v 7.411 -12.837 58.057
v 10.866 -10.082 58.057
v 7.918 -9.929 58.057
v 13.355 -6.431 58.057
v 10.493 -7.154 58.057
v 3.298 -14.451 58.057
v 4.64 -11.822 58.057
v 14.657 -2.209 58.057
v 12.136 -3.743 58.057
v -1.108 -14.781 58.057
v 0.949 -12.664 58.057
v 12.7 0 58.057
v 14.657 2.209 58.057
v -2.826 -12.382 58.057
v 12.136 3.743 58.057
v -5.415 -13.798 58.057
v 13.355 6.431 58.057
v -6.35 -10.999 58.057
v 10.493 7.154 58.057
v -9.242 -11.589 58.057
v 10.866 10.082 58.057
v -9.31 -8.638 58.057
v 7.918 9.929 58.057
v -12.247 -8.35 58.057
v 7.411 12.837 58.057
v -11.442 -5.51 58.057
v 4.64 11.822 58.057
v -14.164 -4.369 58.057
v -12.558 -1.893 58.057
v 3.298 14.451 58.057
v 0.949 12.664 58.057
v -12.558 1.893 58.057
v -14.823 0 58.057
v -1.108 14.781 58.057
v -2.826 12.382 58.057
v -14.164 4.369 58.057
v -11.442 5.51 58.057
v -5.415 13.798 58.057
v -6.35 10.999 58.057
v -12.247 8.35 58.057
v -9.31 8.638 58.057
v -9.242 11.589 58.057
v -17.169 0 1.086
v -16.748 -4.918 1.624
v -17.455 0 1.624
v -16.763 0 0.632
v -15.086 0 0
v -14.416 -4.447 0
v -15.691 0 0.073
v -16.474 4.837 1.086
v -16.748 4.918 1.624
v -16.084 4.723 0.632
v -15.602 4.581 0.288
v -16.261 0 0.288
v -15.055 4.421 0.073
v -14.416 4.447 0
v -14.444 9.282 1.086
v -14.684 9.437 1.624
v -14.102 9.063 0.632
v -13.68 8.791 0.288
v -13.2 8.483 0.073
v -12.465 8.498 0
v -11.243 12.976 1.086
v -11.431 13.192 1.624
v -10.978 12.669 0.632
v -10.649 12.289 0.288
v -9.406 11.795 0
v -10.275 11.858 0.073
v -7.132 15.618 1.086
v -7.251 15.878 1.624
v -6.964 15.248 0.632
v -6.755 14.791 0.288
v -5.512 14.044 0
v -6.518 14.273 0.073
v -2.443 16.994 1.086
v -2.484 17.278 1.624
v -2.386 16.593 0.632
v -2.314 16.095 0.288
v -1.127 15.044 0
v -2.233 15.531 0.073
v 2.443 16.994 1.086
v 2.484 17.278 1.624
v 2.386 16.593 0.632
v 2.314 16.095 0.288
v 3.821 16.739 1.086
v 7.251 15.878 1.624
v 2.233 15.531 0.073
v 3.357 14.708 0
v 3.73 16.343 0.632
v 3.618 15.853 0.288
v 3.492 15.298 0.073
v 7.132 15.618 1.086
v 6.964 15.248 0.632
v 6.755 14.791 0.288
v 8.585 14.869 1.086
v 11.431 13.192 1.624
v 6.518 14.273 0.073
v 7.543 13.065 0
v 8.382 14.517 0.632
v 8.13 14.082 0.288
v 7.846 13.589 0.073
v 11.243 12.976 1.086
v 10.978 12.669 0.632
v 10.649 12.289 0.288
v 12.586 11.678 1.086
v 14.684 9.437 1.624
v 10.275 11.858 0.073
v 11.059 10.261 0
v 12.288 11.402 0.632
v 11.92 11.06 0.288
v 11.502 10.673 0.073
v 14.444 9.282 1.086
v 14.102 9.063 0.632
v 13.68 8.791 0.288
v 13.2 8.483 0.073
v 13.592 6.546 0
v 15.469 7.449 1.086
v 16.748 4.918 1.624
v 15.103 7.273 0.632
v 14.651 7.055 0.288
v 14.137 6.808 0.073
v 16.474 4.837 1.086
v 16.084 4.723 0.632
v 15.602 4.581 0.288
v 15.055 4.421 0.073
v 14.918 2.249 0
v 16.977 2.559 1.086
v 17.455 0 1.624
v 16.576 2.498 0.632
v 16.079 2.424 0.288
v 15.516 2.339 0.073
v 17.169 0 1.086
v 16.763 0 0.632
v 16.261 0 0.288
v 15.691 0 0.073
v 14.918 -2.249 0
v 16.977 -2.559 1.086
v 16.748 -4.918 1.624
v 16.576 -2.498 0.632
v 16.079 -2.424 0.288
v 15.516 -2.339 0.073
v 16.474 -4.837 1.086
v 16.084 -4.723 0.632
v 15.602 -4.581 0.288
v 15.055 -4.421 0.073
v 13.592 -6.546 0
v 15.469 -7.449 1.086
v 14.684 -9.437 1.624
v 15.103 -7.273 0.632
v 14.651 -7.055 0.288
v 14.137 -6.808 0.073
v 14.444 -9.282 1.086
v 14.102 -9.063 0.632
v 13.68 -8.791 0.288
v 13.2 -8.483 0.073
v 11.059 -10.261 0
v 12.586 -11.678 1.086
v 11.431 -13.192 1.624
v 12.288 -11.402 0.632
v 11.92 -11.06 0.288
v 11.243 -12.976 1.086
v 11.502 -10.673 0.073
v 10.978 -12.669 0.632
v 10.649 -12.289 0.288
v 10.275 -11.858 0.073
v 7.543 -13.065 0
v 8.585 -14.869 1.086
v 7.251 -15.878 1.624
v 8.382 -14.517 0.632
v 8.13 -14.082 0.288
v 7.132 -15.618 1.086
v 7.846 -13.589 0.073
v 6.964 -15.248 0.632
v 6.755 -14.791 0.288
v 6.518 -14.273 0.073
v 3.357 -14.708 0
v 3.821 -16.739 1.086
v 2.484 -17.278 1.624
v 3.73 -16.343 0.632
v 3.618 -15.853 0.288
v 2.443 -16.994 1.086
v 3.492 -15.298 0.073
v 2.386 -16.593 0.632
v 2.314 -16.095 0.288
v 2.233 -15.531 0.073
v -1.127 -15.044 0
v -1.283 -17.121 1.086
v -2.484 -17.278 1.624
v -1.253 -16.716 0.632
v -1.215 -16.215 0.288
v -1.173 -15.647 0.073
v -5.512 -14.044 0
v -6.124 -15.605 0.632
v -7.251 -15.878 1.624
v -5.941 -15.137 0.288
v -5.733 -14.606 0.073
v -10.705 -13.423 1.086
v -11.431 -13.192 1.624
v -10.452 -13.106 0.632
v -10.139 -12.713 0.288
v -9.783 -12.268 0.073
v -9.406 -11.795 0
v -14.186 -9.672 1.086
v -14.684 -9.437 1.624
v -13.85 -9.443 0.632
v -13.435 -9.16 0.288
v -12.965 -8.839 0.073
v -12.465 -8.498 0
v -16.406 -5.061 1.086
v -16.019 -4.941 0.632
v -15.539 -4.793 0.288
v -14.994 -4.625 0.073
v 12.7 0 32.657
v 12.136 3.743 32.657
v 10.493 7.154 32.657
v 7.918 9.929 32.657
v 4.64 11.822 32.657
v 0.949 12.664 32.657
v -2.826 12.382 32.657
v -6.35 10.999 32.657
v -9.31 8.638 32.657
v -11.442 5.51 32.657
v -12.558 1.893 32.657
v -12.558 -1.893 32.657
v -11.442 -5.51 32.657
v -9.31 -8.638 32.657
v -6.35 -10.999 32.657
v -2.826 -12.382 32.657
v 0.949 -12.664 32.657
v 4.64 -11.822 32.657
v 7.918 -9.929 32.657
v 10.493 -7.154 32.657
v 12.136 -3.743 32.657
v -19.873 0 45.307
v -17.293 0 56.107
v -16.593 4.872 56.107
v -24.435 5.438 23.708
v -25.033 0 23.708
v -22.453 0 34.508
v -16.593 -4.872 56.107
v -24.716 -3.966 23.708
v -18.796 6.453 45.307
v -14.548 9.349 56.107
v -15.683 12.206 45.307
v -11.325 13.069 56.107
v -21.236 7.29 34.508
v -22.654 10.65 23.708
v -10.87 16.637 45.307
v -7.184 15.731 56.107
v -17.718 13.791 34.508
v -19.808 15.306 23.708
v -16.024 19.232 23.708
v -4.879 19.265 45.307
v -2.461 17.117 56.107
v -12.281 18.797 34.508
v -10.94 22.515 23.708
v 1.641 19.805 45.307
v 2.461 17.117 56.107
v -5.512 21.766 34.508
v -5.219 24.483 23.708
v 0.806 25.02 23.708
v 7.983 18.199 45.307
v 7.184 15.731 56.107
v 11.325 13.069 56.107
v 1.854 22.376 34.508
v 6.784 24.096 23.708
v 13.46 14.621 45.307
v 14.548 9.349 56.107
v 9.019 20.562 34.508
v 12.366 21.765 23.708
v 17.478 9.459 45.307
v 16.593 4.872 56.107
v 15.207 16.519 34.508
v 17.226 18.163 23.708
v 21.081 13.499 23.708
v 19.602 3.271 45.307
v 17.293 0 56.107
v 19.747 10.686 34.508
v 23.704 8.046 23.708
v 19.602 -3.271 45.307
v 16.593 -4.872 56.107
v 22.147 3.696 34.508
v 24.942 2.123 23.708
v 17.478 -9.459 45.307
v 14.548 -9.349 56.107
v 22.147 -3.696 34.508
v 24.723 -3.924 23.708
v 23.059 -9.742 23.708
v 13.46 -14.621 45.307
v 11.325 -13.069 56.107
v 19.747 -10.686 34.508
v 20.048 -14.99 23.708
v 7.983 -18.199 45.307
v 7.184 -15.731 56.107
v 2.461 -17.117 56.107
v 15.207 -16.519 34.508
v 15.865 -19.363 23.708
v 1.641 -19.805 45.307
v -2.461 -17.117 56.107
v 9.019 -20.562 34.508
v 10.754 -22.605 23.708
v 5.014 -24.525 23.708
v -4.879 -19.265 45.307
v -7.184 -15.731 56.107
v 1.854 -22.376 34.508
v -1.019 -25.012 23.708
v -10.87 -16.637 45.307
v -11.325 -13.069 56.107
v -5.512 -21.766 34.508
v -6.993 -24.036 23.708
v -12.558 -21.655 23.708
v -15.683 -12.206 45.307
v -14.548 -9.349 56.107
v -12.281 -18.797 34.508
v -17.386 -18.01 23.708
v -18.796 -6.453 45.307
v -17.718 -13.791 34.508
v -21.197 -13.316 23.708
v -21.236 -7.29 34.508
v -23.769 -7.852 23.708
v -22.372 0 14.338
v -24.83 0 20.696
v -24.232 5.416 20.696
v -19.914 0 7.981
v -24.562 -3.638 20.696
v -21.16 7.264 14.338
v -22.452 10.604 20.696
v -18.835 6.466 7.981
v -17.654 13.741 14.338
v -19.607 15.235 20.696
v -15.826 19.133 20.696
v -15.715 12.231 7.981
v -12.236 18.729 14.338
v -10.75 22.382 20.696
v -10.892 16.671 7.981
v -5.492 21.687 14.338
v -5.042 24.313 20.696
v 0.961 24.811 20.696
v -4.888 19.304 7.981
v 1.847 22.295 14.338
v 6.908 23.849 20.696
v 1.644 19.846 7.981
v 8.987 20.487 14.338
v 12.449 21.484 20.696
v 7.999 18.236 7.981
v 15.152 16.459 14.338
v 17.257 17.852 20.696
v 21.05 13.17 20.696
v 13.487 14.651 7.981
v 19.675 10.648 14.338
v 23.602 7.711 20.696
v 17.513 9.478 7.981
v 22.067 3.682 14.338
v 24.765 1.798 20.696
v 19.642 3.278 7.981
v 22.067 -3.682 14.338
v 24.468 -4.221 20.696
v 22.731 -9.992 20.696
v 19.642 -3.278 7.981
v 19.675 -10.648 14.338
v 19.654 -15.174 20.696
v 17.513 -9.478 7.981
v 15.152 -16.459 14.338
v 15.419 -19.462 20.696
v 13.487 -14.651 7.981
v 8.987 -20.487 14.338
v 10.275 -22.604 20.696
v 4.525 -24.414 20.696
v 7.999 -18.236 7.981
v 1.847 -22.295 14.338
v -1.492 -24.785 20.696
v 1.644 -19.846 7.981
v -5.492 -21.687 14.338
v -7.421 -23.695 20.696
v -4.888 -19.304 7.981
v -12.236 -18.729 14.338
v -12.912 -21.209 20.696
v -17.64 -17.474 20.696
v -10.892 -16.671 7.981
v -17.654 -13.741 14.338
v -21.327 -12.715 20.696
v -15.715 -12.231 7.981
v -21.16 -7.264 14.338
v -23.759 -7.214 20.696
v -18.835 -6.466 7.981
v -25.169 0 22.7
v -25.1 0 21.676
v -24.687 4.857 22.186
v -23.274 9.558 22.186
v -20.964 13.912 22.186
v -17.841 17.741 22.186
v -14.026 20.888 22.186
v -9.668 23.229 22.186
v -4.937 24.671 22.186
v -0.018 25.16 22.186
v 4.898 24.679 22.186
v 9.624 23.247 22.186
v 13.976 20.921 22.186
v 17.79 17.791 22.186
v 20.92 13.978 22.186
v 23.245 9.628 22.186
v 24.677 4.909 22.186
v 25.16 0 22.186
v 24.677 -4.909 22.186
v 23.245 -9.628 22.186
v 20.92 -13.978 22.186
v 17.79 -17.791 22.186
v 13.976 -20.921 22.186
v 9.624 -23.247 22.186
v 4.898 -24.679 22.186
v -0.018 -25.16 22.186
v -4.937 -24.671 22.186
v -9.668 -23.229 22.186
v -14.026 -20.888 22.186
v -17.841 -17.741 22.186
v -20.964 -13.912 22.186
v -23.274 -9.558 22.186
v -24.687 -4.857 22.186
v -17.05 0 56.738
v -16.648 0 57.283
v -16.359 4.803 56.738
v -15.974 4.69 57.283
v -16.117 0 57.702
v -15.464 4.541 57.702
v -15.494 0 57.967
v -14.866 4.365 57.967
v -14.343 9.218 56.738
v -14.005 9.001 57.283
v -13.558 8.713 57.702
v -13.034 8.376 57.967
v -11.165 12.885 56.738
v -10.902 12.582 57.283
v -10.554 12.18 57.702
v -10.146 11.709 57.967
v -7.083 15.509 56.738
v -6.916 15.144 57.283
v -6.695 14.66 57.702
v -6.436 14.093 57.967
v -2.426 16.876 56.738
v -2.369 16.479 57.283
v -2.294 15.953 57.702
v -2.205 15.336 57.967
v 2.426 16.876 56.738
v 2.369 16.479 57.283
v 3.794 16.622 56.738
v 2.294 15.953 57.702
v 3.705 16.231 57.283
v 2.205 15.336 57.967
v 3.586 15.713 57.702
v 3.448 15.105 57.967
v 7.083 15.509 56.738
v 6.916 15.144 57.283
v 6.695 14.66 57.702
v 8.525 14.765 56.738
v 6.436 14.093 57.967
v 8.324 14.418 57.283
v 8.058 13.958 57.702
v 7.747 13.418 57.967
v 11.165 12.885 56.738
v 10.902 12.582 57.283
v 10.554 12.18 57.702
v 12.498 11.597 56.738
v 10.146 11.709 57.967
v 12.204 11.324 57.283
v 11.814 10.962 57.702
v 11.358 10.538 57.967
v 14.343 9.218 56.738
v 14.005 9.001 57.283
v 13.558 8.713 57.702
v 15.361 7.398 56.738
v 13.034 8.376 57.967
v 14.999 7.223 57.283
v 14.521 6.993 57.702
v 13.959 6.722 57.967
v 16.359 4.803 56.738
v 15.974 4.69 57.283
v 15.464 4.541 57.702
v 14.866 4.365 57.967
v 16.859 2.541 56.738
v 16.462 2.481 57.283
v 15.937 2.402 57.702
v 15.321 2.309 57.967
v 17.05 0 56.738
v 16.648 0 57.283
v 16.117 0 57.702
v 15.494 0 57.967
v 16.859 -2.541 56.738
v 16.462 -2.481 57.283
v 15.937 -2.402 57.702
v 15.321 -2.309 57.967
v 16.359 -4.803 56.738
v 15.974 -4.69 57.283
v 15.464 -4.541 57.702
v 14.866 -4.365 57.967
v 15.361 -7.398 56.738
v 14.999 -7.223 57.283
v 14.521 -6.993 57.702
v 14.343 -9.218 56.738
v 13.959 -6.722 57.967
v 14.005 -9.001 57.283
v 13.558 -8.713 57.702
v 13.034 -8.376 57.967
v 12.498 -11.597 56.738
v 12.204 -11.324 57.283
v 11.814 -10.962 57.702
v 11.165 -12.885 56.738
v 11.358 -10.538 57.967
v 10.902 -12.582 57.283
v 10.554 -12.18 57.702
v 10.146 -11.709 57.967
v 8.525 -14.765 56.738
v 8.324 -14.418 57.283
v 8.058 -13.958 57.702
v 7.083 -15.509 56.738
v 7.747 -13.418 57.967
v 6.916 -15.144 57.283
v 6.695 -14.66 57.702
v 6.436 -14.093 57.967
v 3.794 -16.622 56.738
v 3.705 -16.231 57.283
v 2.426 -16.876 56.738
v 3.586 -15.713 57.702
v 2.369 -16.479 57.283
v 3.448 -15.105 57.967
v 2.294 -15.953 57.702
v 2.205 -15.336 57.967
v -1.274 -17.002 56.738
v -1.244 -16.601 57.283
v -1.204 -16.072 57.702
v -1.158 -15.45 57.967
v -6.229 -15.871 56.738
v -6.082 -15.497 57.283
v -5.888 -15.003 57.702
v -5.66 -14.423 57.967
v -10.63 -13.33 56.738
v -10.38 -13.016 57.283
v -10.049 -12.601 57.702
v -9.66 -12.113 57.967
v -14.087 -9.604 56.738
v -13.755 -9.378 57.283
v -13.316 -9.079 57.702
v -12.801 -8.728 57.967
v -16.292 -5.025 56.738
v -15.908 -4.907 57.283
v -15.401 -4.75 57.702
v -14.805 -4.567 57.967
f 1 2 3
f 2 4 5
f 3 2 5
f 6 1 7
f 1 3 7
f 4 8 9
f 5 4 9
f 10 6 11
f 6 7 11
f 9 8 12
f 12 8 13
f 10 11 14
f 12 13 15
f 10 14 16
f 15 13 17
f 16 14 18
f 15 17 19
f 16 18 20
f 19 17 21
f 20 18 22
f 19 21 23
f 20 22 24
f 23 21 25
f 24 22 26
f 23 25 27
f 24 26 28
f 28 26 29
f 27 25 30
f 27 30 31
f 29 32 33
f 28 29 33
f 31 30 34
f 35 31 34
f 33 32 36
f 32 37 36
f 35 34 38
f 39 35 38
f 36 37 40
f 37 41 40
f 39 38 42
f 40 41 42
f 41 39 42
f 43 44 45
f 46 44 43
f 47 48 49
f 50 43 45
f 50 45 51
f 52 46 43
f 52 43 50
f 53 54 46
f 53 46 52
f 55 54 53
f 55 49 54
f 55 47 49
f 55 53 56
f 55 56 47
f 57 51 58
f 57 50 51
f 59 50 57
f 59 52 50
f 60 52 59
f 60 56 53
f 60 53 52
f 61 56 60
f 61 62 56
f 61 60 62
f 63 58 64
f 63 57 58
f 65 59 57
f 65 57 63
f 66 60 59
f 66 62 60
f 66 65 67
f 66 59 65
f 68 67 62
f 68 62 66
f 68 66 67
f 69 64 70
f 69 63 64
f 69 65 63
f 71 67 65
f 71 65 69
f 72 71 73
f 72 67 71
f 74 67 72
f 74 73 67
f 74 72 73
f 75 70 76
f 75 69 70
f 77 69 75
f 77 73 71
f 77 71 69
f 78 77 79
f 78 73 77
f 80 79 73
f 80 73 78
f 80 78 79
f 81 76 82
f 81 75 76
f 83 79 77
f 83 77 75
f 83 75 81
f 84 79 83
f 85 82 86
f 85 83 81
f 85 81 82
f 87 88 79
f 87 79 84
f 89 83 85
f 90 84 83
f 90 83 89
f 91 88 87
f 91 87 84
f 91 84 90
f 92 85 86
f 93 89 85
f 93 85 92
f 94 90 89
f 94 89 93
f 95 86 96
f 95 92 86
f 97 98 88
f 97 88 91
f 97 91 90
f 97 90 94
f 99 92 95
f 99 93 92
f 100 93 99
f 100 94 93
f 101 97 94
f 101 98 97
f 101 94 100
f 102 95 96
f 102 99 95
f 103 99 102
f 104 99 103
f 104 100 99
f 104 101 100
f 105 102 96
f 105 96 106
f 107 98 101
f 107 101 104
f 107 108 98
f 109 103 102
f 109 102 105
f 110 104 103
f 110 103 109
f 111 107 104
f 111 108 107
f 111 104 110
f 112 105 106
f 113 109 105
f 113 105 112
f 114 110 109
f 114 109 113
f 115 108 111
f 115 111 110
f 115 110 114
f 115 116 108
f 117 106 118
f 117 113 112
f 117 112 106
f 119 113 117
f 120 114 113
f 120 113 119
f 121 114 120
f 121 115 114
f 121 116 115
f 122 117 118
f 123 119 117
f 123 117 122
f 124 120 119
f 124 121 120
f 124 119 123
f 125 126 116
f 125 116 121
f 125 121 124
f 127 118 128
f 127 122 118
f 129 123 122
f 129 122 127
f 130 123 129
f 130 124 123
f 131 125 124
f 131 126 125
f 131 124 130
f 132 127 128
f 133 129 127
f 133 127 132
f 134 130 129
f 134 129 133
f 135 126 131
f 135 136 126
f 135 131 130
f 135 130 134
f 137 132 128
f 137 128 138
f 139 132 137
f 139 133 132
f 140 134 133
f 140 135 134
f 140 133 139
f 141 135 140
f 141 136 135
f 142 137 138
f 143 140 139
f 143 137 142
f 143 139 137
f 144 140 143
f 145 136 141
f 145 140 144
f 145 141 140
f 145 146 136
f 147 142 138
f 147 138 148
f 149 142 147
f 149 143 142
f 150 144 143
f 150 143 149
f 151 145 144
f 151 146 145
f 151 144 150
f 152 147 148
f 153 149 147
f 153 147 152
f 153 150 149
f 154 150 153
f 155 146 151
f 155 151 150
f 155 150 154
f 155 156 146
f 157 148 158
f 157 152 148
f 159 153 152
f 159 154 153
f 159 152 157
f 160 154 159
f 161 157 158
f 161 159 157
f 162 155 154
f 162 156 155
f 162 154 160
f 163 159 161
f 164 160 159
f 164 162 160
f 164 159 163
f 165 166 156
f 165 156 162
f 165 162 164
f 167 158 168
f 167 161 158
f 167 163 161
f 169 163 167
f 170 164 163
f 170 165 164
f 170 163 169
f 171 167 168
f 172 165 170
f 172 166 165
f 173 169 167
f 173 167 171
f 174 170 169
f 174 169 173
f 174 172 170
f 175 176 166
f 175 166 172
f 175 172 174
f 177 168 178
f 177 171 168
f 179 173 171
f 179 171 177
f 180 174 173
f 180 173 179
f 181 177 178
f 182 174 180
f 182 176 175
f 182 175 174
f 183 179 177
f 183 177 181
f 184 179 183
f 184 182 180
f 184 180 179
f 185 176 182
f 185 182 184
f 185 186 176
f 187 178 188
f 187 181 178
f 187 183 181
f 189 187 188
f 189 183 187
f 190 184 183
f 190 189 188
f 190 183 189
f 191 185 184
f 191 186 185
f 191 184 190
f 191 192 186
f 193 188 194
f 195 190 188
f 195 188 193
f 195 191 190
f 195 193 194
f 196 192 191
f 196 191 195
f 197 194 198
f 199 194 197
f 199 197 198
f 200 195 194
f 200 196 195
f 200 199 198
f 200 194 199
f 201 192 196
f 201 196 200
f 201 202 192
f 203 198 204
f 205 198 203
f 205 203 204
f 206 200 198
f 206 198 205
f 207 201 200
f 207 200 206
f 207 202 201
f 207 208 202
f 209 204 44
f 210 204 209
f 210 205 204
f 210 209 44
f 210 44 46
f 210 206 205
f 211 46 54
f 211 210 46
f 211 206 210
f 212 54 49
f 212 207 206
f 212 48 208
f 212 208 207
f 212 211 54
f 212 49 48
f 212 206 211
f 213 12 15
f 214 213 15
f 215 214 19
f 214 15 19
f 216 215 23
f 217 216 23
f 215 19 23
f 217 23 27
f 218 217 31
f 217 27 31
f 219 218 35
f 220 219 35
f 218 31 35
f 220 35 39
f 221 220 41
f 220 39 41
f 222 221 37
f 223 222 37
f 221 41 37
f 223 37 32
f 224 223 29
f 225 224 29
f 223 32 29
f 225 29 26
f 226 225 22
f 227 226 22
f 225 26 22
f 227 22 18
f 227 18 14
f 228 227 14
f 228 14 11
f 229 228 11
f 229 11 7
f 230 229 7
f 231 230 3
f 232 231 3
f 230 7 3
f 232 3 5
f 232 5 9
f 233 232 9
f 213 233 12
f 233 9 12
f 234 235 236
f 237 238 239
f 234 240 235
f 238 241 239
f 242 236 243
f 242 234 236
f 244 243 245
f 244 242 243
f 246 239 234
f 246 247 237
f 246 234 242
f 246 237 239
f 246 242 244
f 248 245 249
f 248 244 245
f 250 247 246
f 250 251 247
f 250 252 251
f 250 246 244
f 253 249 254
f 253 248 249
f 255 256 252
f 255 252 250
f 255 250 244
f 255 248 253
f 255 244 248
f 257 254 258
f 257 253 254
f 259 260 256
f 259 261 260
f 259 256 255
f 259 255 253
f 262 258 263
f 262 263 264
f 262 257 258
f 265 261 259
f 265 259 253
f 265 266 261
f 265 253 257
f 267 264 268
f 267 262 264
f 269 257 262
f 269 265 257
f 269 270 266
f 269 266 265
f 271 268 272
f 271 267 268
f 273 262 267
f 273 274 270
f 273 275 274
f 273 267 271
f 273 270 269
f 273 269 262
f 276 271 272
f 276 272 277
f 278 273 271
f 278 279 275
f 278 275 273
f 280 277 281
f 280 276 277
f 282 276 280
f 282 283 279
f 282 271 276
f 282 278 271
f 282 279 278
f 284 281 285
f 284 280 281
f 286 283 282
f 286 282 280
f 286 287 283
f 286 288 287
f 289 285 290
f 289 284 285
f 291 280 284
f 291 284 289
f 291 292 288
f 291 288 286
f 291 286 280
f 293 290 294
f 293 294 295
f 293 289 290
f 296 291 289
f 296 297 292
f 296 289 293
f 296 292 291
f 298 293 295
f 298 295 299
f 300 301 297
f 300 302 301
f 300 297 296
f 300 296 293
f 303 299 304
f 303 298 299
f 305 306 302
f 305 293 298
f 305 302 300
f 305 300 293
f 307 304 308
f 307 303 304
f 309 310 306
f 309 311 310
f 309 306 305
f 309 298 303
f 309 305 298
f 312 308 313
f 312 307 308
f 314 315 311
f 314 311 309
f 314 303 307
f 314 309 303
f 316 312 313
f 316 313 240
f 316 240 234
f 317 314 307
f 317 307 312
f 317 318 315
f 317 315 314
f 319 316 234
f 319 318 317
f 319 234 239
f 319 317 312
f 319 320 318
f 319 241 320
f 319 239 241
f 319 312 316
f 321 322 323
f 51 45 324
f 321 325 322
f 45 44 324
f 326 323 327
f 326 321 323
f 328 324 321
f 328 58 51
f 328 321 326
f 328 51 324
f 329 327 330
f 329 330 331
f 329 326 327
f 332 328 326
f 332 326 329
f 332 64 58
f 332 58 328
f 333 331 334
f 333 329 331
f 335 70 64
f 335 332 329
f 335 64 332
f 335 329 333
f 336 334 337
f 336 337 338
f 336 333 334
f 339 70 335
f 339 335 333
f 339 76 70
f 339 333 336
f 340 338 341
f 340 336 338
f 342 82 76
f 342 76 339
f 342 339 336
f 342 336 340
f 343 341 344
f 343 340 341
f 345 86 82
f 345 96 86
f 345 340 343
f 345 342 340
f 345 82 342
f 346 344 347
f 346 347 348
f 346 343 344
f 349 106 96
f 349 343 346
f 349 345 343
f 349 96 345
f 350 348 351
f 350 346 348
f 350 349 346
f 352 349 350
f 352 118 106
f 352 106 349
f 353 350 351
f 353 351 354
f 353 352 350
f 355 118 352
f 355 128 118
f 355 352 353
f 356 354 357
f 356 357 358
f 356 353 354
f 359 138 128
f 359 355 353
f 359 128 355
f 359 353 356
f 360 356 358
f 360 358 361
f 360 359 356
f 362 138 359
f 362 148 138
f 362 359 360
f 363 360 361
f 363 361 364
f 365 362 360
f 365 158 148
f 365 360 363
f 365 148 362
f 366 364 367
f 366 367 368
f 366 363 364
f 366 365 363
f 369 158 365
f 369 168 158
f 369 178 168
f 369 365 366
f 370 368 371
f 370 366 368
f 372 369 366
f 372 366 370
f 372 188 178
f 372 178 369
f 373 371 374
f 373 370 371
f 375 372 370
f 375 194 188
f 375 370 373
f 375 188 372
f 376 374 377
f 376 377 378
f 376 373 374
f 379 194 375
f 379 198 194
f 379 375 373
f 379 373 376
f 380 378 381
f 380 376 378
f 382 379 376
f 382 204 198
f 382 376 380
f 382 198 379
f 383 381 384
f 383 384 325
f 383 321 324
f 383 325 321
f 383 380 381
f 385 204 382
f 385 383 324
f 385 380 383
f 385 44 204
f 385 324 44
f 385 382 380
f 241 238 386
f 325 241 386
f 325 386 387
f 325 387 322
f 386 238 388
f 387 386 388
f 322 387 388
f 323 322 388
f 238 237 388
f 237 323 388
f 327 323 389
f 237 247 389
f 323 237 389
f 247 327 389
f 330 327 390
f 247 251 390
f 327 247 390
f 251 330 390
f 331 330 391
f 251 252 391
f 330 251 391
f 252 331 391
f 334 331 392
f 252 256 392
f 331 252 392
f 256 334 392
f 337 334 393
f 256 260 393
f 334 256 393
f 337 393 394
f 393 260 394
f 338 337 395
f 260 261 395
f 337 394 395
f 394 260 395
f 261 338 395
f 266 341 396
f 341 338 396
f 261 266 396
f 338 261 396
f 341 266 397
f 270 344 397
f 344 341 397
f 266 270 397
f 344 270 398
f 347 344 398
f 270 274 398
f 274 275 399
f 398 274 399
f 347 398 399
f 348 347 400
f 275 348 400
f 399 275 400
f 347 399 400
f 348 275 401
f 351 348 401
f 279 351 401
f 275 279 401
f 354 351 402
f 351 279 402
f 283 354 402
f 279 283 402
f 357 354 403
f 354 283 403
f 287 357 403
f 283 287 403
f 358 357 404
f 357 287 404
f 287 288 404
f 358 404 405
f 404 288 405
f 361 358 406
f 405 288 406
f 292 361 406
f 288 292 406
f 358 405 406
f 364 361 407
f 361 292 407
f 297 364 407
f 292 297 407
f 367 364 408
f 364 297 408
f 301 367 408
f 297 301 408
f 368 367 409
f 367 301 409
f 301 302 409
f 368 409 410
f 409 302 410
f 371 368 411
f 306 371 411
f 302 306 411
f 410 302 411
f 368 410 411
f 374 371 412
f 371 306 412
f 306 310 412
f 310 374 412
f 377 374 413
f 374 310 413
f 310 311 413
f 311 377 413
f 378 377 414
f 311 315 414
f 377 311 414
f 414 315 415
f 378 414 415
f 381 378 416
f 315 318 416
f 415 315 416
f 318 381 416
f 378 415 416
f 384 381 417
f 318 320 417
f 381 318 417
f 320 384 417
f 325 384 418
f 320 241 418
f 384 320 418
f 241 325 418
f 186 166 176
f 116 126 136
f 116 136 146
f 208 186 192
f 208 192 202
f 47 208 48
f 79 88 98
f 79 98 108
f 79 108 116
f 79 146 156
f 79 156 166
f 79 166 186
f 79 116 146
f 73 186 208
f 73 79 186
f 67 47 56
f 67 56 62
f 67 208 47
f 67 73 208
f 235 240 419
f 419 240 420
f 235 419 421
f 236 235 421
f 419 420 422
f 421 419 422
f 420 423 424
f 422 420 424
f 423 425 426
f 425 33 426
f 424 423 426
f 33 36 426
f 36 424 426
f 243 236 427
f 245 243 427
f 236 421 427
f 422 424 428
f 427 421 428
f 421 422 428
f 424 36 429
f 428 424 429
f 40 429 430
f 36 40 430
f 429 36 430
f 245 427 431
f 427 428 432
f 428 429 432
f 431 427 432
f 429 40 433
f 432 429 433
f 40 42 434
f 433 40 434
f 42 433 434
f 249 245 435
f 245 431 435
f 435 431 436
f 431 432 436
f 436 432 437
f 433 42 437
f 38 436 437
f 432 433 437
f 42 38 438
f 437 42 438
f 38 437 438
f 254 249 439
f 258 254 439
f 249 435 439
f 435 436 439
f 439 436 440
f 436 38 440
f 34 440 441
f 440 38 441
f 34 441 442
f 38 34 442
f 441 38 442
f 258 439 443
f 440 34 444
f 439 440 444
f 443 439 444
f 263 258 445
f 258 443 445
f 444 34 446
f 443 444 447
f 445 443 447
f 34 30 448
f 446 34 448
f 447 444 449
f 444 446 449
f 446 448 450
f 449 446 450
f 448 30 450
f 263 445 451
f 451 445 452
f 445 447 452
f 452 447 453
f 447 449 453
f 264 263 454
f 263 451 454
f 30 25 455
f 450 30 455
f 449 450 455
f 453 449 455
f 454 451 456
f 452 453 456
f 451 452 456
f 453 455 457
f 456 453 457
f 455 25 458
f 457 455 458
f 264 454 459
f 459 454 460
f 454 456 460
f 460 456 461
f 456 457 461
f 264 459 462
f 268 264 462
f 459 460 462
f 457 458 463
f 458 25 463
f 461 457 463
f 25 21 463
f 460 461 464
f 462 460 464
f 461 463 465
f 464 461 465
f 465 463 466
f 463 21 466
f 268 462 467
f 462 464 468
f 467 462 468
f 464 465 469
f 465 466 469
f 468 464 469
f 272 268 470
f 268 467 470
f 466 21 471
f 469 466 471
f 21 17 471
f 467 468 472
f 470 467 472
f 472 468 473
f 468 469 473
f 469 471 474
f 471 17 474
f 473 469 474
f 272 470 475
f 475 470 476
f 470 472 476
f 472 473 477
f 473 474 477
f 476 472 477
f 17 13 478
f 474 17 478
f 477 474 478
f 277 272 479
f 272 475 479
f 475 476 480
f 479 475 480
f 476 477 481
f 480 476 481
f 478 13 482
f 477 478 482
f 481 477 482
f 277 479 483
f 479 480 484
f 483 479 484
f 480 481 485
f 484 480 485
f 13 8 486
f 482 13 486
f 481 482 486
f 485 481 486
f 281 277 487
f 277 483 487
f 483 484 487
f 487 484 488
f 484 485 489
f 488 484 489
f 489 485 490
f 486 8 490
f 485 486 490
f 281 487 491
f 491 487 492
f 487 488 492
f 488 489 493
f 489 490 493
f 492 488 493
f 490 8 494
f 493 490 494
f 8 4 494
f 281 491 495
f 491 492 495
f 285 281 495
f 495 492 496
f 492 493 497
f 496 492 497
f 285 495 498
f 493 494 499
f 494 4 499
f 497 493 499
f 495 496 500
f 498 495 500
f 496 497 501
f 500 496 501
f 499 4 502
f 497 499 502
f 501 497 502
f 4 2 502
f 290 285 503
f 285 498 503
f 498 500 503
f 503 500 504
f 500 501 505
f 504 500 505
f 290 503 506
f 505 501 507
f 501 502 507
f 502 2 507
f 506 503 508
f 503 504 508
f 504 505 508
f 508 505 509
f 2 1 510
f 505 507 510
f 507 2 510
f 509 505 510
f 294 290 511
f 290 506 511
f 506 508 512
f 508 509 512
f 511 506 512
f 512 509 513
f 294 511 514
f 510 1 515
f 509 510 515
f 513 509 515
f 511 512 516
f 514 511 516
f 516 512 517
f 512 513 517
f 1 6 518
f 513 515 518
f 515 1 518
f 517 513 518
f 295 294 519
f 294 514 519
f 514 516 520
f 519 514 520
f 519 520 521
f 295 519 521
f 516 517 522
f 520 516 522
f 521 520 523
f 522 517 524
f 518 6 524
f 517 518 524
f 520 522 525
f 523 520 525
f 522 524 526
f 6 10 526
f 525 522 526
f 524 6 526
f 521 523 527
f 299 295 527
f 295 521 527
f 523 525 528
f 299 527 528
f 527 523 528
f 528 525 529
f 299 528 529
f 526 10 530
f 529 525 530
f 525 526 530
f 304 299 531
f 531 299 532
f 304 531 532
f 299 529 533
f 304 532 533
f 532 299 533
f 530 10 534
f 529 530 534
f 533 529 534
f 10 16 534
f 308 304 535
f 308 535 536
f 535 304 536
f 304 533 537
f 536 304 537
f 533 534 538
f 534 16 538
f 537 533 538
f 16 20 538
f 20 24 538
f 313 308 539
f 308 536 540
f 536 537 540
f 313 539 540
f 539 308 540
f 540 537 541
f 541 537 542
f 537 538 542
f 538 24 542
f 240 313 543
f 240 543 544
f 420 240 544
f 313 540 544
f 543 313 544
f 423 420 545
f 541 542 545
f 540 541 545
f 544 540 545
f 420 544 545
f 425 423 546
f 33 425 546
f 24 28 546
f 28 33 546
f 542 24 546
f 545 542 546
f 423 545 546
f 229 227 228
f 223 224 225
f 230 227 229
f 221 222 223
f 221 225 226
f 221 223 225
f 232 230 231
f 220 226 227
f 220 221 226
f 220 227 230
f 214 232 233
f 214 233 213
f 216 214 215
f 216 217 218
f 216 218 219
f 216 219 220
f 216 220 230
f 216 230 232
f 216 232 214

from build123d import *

# Parameters (mm, degrees)
F0_W     = 16.8275
F0_H     = 22.170253424
F0_H_2   = 35.886526576
F2_R     = 5.08
F3_R     = 2.54
F4_R     = 2.54
F5_R     = 12.7
F6_DEPTH = 25.4


with BuildPart() as f1:
    # F0 (on Front) → F1 (revolve)
    with BuildSketch(Plane.XZ):
        with Locations((-8.41375, 11.085126712)):
            Rectangle(F0_W, F0_H)
        with Locations((-8.41375, 40.113516712)):
            Rectangle(F0_W, F0_H_2)
        Polygon((-25.4, 22.170253424), (-16.8275, 0), (-16.8275, 22.170253424), align=None)
        Polygon((-25.4, 22.170253424), (-16.8275, 22.170253424), (-16.8275, 58.05678), align=None)
    revolve(axis=Axis((0, 0, 40.113516712), (0, 0, -1)))

    # F2
    f2_edges = [f1.edges().sort_by_distance(p)[0] for p in [
        (25.4, 0, 22.170253),
    ]]
    fillet(f2_edges, radius=F2_R)

    # F3
    f3_edges = [f1.edges().sort_by_distance(p)[0] for p in [
        (-20.828657, 0, 10.347817),
        (24.829814, 0, 20.695635),
        (16.8275, 0, 0),
    ]]
    fillet(f3_edges, radius=F3_R)

    # F4
    f4_edges = [f1.edges().sort_by_distance(p)[0] for p in [
        (16.8275, 0, 58.05678),
    ]]
    fillet(f4_edges, radius=F4_R)

    # F5 (on face) → F6 (cut)
    with BuildSketch(Plane.XY.offset(58.05678)):
        Circle(F5_R)
    extrude(amount=-F6_DEPTH, mode=Mode.SUBTRACT)


solid = f1.part
